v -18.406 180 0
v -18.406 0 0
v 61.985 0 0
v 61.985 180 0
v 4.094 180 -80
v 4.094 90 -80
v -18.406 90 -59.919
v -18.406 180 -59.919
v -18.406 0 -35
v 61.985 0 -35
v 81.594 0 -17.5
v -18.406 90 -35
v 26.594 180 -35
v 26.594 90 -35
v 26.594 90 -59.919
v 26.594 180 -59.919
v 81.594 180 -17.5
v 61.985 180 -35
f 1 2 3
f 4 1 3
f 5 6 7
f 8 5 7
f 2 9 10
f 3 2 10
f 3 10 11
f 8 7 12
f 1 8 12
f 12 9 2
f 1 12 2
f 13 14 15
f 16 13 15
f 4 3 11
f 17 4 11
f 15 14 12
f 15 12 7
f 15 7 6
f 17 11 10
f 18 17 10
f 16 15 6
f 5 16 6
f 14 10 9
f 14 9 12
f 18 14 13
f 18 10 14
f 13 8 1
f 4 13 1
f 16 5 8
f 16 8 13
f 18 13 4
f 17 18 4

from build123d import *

# Parameters (mm, degrees)
EXTRUDE_1_DEPTH     = 180
SKETCH_4_W          = 115.68849301
SKETCH_4_H          = 90
CUT_EXTRUDE_1_DEPTH = 200


with BuildPart() as part:
    # 草图1 → 凸台-拉伸1 (new body)
    with BuildSketch(Plane(origin=(0, 0, 0), x_dir=(1, 0, 0), z_dir=(0, 1, 0))):
        Polygon((-18.406325618, 0), (61.985157699, 0), (81.593674382, 17.5), (61.985157699, 35), (26.593674382, 35), (26.593674382, 59.919439784), (4.093674382, 80), (-18.406325618, 59.919439784), align=None)
    extrude(amount=EXTRUDE_1_DEPTH)

    # 草图4 → 切除-拉伸1 (cut)
    with BuildSketch(Plane(origin=(26.593674382, 0, 0), x_dir=(0, 0, -1), z_dir=(1, 0, 0))):
        with Locations((92.844246505, 45)):
            Rectangle(SKETCH_4_W, SKETCH_4_H)
    extrude(amount=-CUT_EXTRUDE_1_DEPTH, mode=Mode.SUBTRACT)


solid = part.part
